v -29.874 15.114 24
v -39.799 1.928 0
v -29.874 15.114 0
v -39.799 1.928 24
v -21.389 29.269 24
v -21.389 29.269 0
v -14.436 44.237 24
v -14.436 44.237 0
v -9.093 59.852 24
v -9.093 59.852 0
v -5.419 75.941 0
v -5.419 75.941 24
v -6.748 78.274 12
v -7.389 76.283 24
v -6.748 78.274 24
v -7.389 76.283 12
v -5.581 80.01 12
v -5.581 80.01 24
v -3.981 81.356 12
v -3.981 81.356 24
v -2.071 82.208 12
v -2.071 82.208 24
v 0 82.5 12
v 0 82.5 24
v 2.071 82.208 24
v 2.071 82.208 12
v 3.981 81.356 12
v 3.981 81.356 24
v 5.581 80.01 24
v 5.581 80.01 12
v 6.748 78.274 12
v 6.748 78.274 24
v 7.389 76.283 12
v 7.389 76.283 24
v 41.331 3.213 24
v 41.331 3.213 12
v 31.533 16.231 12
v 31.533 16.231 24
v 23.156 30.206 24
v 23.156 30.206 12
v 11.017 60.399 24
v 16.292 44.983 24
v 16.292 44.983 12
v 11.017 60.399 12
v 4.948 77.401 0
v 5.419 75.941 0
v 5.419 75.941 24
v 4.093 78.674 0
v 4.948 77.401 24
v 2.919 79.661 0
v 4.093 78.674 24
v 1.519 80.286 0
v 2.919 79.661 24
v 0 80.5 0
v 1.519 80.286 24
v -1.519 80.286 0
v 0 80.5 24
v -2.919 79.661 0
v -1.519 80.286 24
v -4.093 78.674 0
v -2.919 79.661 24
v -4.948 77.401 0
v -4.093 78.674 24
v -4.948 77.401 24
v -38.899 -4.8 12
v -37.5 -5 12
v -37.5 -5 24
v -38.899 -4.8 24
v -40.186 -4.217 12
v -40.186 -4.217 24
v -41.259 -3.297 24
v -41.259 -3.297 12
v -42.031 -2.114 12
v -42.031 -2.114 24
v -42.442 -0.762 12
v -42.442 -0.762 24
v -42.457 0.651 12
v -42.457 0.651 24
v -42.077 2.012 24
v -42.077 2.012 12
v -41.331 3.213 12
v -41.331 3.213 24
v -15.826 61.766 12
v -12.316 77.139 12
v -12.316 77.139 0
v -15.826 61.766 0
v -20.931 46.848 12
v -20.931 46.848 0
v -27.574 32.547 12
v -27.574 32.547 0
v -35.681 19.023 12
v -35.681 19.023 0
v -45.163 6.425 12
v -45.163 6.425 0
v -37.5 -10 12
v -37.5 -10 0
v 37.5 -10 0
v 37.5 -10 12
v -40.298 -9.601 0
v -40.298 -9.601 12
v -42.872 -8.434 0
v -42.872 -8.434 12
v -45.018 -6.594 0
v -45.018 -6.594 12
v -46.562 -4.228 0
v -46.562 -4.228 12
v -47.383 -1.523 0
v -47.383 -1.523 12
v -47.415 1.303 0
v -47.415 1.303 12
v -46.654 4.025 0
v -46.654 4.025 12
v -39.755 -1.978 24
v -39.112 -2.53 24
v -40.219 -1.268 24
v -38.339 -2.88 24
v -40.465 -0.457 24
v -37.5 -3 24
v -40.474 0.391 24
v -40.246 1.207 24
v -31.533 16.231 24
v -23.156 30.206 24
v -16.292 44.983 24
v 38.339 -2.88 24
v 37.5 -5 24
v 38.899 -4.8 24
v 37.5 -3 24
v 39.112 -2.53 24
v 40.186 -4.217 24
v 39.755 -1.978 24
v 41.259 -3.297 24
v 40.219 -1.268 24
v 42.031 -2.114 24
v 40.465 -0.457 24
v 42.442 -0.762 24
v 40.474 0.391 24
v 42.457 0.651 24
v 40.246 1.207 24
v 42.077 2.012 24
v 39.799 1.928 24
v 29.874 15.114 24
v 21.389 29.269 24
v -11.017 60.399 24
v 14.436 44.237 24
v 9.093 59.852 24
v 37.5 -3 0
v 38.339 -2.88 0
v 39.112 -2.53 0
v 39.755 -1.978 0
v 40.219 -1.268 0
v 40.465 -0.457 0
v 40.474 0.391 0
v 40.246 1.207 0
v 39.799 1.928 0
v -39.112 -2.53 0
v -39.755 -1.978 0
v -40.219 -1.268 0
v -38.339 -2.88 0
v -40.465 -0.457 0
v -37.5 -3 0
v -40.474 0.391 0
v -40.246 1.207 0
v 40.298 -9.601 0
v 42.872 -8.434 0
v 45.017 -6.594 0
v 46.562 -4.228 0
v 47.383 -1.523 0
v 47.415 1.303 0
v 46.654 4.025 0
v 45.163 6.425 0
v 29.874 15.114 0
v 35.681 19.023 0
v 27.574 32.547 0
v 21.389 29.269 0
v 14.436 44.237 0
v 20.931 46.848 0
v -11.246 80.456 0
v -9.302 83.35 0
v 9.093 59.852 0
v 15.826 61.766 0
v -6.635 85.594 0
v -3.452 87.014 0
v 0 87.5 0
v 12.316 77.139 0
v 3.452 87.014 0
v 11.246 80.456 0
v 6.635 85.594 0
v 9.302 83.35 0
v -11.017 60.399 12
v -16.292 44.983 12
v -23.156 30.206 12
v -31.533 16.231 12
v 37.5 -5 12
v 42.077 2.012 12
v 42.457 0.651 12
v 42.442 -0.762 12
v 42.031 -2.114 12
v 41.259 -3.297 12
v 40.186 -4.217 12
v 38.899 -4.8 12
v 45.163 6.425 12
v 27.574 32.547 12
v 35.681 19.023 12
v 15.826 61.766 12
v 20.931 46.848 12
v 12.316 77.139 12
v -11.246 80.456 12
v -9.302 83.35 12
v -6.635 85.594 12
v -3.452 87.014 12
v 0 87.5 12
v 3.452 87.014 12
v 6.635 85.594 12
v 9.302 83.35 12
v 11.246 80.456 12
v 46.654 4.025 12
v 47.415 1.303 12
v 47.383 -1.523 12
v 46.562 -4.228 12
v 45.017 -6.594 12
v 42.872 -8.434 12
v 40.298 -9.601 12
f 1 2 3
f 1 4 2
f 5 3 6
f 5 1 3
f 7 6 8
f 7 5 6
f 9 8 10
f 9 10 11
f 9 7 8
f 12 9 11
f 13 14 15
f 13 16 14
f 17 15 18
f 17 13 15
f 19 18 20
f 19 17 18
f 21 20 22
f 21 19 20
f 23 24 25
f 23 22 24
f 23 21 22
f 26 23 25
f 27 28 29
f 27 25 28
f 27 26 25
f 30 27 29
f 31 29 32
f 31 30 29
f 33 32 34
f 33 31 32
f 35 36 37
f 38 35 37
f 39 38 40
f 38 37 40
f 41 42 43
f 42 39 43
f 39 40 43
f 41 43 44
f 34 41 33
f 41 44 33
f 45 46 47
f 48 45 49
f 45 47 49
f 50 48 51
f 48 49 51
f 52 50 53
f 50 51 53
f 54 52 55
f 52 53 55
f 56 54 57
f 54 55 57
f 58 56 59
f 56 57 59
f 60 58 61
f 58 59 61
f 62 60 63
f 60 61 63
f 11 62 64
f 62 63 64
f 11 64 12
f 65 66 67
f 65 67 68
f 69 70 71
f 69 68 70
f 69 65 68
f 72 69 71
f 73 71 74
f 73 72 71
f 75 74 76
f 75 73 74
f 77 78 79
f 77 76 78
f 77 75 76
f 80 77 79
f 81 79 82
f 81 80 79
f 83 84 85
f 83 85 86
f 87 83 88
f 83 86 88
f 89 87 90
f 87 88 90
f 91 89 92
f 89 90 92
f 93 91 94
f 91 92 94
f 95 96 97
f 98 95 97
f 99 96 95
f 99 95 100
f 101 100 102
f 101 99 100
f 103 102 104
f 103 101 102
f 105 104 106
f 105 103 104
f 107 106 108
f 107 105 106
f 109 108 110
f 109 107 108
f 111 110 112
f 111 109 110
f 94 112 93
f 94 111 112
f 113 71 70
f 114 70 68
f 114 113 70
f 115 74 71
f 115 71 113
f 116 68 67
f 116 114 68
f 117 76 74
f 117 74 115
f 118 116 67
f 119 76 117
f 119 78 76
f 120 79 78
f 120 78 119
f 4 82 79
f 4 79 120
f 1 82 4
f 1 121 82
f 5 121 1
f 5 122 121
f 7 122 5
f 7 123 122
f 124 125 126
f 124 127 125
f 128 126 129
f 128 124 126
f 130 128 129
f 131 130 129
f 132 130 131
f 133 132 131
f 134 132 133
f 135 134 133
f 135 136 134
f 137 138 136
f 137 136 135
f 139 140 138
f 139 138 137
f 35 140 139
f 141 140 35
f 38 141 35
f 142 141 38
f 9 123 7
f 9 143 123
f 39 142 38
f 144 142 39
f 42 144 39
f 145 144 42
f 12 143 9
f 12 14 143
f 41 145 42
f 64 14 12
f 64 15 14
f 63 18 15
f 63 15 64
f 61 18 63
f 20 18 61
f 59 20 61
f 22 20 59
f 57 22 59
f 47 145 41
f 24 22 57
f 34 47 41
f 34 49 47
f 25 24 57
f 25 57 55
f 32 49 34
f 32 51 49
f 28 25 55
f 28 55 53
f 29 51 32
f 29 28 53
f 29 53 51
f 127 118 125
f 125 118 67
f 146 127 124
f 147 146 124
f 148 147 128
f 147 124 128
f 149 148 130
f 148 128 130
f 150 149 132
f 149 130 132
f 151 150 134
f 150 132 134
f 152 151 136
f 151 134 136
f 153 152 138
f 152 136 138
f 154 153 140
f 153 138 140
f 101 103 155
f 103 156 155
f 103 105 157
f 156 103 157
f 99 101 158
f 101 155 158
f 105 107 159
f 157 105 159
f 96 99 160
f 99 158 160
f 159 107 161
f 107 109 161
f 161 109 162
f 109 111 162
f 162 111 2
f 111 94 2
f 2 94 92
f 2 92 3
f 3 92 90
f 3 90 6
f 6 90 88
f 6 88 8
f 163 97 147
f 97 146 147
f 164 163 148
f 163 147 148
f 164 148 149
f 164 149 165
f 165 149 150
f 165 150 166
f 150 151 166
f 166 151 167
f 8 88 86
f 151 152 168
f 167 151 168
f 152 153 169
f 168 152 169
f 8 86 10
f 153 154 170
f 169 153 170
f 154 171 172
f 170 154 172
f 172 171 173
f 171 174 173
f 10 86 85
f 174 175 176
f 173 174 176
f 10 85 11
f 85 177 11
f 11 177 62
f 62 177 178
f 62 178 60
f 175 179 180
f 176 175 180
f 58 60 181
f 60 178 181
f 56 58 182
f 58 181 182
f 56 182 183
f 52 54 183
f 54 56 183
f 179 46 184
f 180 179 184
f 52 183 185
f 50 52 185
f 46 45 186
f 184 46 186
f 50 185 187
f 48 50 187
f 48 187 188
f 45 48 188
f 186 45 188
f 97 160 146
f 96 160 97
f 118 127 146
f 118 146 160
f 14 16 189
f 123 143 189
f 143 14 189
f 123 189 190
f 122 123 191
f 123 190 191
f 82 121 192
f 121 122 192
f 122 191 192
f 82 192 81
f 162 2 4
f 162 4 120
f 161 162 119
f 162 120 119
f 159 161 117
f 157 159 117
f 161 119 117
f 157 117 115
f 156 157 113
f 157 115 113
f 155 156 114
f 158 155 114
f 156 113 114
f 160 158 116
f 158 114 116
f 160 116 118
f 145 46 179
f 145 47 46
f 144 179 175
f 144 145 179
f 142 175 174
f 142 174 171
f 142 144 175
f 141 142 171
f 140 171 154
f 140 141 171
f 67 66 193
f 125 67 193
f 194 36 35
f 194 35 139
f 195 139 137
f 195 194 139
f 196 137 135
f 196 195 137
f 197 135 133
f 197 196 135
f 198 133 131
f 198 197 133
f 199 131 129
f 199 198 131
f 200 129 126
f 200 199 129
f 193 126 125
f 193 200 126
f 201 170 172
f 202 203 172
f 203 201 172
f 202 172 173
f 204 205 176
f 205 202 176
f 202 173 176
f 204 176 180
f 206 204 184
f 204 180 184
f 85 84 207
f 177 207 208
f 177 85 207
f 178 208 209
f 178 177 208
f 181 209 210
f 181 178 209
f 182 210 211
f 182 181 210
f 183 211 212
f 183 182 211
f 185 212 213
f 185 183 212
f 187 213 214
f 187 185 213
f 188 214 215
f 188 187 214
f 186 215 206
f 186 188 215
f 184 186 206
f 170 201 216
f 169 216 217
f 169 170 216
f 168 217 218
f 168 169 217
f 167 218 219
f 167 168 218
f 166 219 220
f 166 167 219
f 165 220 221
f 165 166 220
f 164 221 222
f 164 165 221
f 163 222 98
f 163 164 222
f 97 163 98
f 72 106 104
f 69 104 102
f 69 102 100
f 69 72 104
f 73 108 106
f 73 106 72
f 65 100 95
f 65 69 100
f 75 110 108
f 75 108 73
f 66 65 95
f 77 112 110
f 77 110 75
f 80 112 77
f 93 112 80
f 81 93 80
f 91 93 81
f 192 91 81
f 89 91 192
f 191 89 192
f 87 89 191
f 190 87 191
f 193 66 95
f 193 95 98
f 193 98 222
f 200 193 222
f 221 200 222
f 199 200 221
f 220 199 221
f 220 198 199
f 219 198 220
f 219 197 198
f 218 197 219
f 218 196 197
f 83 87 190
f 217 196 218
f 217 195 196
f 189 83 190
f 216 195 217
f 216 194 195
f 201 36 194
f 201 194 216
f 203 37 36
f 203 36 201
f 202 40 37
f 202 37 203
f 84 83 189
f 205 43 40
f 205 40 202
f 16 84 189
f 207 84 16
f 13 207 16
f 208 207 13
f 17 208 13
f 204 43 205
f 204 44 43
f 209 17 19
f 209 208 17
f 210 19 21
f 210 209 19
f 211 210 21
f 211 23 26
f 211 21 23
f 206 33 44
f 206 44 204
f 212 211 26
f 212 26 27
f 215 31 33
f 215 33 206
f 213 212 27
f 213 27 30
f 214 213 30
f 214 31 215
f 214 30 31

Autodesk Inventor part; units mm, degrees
ref_plane "XY Plane" through (0, 0, 0) normal (0, 0, 1) x (1, 0, 0)
sketch "Sketch1" plane through (0, 0, 0) normal (0, 0, 1) x (1, 0, 0)
  line L0 (0, 137.3747) -> (0, -23.9646) projected
  line L1 (-192.1248, 0) -> (256.1664, 0) projected
  arc A0 (-45.1628, 6.4251) -> (-37.5, -10) centre (-37.5, 0) ccw
  arc A1 (37.5, -10) -> (45.1628, 6.4251) centre (37.5, 0) ccw
  arc A2 (12.3157, 77.1386) -> (-12.3157, 77.1386) centre (0, 75) ccw
  arc A3 (-45.1628, 6.4251) -> (-12.3157, 77.1386) centre (-160.104, 102.802) ccw
  arc A4 (12.3157, 77.1386) -> (45.1628, 6.4251) centre (160.104, 102.802) ccw
  line L2 (-37.5, -10) -> (37.5, -10)
  dimension "d0" = 20
  dimension "d1" = 25
  dimension "d2" = 75
  dimension "d3" = 75
  dimension "d4" = 150
extrude "Extrusion1" add sketch "Sketch1" along normal blind 12
sketch "Sketch2" plane through (0, 0, 12) normal (0, 0, 1) x (1, 0, 0)
  arc A0 (-45.1628, 6.4251) -> (-12.3157, 77.1386) centre (-160.104, 102.802) ccw projected
  arc A1 (-45.1628, 6.4251) -> (-37.5, -10) centre (-37.5, 0) ccw projected
  line L0 (37.5, -10) -> (-37.5, -10) projected
  arc A2 (37.5, -10) -> (45.1628, 6.4251) centre (37.5, 0) ccw projected
  arc A3 (12.3157, 77.1386) -> (45.1628, 6.4251) centre (160.104, 102.802) ccw projected
  arc A4 (12.3157, 77.1386) -> (-12.3157, 77.1386) centre (0, 75) ccw projected
  arc A5 (-41.3314, 3.2126) -> (-7.3894, 76.2832) centre (-160.104, 102.802) ccw
  arc A6 (-41.3314, 3.2126) -> (-37.5, -5) centre (-37.5, 0) ccw
  line L1 (-37.5, -5) -> (37.5, -5)
  arc A7 (37.5, -5) -> (41.3314, 3.2126) centre (37.5, 0) ccw
  arc A8 (7.3894, 76.2832) -> (41.3314, 3.2126) centre (160.104, 102.802) ccw
  arc A9 (7.3894, 76.2832) -> (-7.3894, 76.2832) centre (0, 75) ccw
  dimension "d7" = 5
extrude "Extrusion2" add sketch "Sketch2" along normal blind 12 contours A5 A9 A8 A7 L1 A6
sketch "Sketch3" plane through (0, 0, 24) normal (0, 0, 1) x (1, 0, 0)
  arc A0 (5.4189, 75.941) -> (-5.4189, 75.941) centre (0, 75) ccw
  arc A1 (5.4189, 75.941) -> (39.7988, 1.9275) centre (160.104, 102.802) ccw
  arc A2 (37.5, -3) -> (39.7988, 1.9275) centre (37.5, 0) ccw
  line L0 (37.5, -3) -> (-37.5, -3)
  arc A3 (-39.7988, 1.9275) -> (-37.5, -3) centre (-37.5, 0) ccw
  arc A4 (-39.7988, 1.9275) -> (-5.4189, 75.941) centre (-160.104, 102.802) ccw
  line L1 (0, 116.75) -> (0, -19.75) projected
  line L2 (-57, 0) -> (76, 0) projected
  dimension "d13" = 3
extrude "Extrusion3" cut sketch "Sketch3" against normal through all
properties part number "redefine"
